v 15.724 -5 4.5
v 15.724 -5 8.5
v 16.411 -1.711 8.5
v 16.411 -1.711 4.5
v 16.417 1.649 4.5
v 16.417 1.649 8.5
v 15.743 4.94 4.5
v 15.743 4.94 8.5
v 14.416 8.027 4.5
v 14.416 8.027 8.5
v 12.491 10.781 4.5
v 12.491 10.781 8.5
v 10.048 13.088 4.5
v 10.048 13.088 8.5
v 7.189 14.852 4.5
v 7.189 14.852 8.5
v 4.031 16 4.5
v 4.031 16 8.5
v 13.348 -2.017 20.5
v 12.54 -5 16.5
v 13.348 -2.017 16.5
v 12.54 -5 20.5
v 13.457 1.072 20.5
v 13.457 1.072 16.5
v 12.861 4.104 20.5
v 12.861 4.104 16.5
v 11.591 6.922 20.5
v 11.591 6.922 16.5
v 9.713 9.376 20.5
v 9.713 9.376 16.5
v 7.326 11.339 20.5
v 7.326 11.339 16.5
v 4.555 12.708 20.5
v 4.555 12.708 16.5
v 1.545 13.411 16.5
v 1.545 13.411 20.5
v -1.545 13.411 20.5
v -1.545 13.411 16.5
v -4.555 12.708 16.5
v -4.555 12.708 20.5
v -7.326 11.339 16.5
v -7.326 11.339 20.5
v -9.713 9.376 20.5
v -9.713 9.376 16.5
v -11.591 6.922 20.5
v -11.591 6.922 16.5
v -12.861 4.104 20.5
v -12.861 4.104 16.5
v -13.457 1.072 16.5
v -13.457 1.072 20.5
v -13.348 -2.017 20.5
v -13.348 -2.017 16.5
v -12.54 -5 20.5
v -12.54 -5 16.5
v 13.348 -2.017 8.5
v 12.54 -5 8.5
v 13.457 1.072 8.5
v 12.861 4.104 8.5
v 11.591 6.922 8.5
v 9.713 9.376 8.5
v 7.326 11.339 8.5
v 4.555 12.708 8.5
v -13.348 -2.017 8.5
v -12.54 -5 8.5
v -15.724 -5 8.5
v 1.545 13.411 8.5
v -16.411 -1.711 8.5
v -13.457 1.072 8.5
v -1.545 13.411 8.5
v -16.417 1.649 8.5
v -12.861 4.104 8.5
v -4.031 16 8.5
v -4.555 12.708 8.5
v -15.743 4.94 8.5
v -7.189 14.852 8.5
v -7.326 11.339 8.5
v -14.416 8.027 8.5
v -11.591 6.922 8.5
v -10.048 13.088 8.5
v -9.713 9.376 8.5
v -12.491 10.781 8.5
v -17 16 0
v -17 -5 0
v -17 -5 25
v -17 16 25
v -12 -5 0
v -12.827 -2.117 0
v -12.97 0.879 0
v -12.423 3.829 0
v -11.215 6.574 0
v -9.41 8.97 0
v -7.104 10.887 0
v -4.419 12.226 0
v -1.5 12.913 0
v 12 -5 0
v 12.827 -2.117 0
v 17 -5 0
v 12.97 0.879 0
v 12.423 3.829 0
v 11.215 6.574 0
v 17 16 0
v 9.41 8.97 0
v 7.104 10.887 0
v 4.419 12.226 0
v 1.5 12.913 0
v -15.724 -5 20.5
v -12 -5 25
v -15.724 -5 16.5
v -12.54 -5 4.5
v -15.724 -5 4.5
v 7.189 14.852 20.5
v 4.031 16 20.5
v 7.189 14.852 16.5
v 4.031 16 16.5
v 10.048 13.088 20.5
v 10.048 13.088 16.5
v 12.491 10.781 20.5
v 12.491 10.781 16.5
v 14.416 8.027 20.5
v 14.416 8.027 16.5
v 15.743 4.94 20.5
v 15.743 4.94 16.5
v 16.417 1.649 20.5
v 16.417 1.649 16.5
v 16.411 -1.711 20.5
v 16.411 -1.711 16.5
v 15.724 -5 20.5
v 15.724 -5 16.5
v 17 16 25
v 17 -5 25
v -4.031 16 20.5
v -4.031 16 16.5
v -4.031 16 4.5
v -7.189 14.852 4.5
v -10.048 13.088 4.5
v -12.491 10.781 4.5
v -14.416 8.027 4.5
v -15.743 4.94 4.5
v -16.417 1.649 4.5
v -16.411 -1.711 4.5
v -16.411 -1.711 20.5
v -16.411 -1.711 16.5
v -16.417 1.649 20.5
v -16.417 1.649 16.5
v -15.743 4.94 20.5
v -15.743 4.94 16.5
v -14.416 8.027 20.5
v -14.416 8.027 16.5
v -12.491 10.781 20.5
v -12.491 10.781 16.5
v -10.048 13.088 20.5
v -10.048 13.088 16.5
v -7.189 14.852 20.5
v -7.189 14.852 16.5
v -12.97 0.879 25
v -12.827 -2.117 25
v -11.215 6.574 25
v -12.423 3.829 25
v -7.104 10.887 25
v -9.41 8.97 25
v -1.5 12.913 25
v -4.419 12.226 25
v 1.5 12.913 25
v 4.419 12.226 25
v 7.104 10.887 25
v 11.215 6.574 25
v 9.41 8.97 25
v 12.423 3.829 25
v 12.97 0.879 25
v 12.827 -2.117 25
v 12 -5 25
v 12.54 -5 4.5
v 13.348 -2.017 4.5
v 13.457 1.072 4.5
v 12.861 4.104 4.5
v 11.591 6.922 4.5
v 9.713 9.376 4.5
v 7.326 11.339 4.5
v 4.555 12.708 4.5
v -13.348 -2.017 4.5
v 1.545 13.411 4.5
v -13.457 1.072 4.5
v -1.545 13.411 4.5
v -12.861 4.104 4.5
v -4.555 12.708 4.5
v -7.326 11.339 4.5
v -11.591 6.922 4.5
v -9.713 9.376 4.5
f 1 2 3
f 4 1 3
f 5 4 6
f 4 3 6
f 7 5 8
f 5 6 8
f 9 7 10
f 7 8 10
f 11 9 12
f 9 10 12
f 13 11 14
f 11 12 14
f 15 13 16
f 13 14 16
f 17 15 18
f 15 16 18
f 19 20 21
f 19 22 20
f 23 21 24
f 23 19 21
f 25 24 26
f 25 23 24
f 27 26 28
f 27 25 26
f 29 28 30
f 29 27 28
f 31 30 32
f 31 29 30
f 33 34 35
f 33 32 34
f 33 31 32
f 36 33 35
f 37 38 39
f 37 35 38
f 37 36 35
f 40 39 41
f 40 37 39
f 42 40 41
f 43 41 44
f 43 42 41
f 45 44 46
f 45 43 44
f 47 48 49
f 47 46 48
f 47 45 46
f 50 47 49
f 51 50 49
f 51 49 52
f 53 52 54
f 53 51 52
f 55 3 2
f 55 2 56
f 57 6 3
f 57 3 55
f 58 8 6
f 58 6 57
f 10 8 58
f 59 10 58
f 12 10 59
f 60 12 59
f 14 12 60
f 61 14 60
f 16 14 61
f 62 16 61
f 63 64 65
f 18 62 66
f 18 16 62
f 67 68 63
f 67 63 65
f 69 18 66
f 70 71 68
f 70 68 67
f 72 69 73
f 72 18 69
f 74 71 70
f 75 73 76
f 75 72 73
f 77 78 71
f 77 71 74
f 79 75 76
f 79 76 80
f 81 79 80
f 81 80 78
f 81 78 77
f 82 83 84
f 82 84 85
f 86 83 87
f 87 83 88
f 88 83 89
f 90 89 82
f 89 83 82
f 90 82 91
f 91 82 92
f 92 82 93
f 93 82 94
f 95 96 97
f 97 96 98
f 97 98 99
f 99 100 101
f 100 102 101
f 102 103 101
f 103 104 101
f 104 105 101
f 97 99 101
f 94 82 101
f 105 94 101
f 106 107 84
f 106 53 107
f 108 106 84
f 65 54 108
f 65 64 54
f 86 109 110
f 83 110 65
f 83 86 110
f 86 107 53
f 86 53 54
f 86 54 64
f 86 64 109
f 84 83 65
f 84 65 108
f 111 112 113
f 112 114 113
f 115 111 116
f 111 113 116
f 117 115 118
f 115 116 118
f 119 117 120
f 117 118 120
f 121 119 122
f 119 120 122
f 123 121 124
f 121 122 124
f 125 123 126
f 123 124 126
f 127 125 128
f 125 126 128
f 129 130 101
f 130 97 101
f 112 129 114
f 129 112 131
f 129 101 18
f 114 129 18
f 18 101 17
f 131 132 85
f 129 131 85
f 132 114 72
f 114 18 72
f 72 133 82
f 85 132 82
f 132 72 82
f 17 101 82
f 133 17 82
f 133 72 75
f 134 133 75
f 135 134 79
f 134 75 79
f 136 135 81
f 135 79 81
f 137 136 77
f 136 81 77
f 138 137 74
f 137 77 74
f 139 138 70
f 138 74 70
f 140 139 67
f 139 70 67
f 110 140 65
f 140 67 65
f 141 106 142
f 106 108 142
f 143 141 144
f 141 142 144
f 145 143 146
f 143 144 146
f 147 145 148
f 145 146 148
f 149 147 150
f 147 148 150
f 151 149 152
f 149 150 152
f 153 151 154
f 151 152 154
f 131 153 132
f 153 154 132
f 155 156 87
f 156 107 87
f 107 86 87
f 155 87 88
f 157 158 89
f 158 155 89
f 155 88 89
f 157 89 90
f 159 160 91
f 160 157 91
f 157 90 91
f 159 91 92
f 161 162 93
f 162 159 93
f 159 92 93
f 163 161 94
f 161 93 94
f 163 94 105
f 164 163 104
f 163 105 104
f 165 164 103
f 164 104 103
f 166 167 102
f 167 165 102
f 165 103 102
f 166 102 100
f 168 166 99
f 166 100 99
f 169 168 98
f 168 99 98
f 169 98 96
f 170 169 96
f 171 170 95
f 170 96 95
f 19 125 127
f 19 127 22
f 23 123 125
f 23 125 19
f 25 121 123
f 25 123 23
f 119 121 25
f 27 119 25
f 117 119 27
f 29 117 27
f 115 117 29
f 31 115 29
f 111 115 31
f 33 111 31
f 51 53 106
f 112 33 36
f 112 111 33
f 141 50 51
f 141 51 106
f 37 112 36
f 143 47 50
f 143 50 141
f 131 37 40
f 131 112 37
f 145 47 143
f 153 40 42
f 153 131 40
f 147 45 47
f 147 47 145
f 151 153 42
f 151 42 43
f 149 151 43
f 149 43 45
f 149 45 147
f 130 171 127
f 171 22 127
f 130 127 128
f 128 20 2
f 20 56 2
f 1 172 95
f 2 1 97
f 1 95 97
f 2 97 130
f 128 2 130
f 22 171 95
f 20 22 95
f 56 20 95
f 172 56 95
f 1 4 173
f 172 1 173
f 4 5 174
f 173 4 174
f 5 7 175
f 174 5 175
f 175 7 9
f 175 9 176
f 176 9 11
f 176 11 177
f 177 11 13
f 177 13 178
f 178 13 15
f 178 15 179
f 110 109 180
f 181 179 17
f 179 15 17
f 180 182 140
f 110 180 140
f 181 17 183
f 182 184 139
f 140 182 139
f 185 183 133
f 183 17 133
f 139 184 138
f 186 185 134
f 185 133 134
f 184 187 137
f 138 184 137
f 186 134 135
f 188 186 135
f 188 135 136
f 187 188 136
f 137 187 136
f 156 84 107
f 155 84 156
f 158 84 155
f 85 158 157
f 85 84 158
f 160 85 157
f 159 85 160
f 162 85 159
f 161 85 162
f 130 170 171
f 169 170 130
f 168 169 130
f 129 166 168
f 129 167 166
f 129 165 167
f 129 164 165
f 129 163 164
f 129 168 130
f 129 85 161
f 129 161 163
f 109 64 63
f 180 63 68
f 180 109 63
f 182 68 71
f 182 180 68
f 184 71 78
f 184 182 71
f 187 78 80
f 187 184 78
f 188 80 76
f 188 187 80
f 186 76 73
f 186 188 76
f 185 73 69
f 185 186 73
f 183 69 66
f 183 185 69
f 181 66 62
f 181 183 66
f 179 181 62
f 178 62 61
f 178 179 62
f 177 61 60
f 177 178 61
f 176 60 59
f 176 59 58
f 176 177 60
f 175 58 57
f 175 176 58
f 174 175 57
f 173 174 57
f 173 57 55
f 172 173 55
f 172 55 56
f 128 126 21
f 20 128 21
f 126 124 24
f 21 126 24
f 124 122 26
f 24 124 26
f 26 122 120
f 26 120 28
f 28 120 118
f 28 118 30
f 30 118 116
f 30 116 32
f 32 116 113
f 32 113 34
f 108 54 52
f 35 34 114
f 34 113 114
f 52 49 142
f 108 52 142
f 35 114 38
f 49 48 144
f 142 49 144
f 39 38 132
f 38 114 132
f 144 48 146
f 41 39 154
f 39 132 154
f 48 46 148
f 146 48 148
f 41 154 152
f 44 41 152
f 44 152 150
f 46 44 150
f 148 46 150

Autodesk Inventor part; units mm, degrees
ref_plane "YZ Plane" through (0, 0, 0) normal (1, 0, 0) x (0, 1, 0)
ref_plane "XZ Plane" through (0, 0, 0) normal (0, 1, 0) x (-1, 0, 0)
ref_plane "XY Plane" through (0, 0, 0) normal (0, 0, 1) x (1, 0, 0)
sketch "Sketch1" plane through (0, 0, 0) normal (0, 0, 1) x (1, 0, 0)
  arc A0 (12, -5) -> (-12, -5) centre (0, 0) ccw
  line L0 (0, 0) -> (0, -5)
  line L1 (-12, -5) -> (-17, -5)
  line L2 (-17, -5) -> (-17, 16)
  line L3 (0, -5) -> (17, -5)
  line L4 (17, -5) -> (17, 16)
  line L5 (17, 16) -> (-17, 16)
  dimension "d0" = 26
  dimension "d1" = 5
  dimension "d2" = 17
  dimension "d3" = 21
  dimension "d4" = 17
  dimension "d5" = 21
extrude "Extrusion1" add sketch "Sketch1" along normal blind 25
ref_plane "Work Plane1" through (0, 0, 0) normal (0, -1, 0) x (1, 0, 0)
sketch "Sketch2" plane through (0, 0, 0) normal (0, -1, 0) x (1, 0, 0)
  line L0 (0, 0) -> (0, 25)
  line L1 (-13, 25) -> (13, 25) projected
  line L2 (0, 12.5) -> (-13, 12.5)
  line L3 (-13, 12.5) -> (-15, 12.5)
  line L4 (-15, 12.5) -> (-15, 16.5)
  line L5 (-15, 16.5) -> (-13.5, 16.5)
  line L6 (-13.5, 16.5) -> (-13.5, 20.5)
  line L7 (-13.5, 20.5) -> (-16.5, 20.5)
  line L8 (-16.5, 20.5) -> (-16.5, 16.5)
  line L9 (-16.5, 16.5) -> (-15, 16.5)
  line L10 (-15, 12.5) -> (-15, 8.5)
  line L11 (-15, 8.5) -> (-13.5, 8.5)
  line L12 (-13.5, 8.5) -> (-13.5, 4.5)
  line L13 (-13.5, 4.5) -> (-16.5, 4.5)
  line L14 (-16.5, 4.5) -> (-16.5, 8.5)
  line L15 (-16.5, 8.5) -> (-15, 8.5)
  line L16 (13, 12.5) -> (15, 12.5)
  line L17 (15, 12.5) -> (15, 16.5)
  line L18 (15, 16.5) -> (13.5, 16.5)
  line L19 (13.5, 16.5) -> (13.5, 20.5)
  line L20 (13.5, 20.5) -> (16.5, 20.5)
  line L21 (16.5, 20.5) -> (16.5, 16.5)
  line L22 (16.5, 16.5) -> (15, 16.5)
  line L23 (15, 12.5) -> (15, 8.5)
  line L24 (15, 8.5) -> (13.5, 8.5)
  line L25 (13.5, 8.5) -> (13.5, 4.5)
  line L26 (13.5, 4.5) -> (16.5, 4.5)
  line L27 (16.5, 4.5) -> (16.5, 8.5)
  line L28 (16.5, 8.5) -> (15, 8.5)
  point P0 (-12, 25)
  point P1 (12, 25)
  dimension "d8" = 2
  dimension "d9" = 4
  dimension "d10" = 1.5
  dimension "d11" = 4
  dimension "d12" = 3
  dimension "d13" = 4
revolve "Revolution1" cut sketch "Sketch2" angle 180 about axis through (0, 0, 0) along (0, 0, -1)
equation "\"BendRadius\" = Thickness"
equation "\"BendReliefWidth\" = Thickness"
equation "\"BendReliefDepth\" = 0.5 * Thickness"
equation "\"CornerReliefSize\" = 4 * Thickness"
equation "\"MinimumRemnant\" = 2 * Thickness"
equation "\"TransitionRadius\" = BendRadius"
equation "\"JacobiRadiusSize\" = BendRadius"
equation "\"GapSize\" = Thickness"
equation "\"Thickness\" = 0.5"
properties part number "abrazadera_smps"
